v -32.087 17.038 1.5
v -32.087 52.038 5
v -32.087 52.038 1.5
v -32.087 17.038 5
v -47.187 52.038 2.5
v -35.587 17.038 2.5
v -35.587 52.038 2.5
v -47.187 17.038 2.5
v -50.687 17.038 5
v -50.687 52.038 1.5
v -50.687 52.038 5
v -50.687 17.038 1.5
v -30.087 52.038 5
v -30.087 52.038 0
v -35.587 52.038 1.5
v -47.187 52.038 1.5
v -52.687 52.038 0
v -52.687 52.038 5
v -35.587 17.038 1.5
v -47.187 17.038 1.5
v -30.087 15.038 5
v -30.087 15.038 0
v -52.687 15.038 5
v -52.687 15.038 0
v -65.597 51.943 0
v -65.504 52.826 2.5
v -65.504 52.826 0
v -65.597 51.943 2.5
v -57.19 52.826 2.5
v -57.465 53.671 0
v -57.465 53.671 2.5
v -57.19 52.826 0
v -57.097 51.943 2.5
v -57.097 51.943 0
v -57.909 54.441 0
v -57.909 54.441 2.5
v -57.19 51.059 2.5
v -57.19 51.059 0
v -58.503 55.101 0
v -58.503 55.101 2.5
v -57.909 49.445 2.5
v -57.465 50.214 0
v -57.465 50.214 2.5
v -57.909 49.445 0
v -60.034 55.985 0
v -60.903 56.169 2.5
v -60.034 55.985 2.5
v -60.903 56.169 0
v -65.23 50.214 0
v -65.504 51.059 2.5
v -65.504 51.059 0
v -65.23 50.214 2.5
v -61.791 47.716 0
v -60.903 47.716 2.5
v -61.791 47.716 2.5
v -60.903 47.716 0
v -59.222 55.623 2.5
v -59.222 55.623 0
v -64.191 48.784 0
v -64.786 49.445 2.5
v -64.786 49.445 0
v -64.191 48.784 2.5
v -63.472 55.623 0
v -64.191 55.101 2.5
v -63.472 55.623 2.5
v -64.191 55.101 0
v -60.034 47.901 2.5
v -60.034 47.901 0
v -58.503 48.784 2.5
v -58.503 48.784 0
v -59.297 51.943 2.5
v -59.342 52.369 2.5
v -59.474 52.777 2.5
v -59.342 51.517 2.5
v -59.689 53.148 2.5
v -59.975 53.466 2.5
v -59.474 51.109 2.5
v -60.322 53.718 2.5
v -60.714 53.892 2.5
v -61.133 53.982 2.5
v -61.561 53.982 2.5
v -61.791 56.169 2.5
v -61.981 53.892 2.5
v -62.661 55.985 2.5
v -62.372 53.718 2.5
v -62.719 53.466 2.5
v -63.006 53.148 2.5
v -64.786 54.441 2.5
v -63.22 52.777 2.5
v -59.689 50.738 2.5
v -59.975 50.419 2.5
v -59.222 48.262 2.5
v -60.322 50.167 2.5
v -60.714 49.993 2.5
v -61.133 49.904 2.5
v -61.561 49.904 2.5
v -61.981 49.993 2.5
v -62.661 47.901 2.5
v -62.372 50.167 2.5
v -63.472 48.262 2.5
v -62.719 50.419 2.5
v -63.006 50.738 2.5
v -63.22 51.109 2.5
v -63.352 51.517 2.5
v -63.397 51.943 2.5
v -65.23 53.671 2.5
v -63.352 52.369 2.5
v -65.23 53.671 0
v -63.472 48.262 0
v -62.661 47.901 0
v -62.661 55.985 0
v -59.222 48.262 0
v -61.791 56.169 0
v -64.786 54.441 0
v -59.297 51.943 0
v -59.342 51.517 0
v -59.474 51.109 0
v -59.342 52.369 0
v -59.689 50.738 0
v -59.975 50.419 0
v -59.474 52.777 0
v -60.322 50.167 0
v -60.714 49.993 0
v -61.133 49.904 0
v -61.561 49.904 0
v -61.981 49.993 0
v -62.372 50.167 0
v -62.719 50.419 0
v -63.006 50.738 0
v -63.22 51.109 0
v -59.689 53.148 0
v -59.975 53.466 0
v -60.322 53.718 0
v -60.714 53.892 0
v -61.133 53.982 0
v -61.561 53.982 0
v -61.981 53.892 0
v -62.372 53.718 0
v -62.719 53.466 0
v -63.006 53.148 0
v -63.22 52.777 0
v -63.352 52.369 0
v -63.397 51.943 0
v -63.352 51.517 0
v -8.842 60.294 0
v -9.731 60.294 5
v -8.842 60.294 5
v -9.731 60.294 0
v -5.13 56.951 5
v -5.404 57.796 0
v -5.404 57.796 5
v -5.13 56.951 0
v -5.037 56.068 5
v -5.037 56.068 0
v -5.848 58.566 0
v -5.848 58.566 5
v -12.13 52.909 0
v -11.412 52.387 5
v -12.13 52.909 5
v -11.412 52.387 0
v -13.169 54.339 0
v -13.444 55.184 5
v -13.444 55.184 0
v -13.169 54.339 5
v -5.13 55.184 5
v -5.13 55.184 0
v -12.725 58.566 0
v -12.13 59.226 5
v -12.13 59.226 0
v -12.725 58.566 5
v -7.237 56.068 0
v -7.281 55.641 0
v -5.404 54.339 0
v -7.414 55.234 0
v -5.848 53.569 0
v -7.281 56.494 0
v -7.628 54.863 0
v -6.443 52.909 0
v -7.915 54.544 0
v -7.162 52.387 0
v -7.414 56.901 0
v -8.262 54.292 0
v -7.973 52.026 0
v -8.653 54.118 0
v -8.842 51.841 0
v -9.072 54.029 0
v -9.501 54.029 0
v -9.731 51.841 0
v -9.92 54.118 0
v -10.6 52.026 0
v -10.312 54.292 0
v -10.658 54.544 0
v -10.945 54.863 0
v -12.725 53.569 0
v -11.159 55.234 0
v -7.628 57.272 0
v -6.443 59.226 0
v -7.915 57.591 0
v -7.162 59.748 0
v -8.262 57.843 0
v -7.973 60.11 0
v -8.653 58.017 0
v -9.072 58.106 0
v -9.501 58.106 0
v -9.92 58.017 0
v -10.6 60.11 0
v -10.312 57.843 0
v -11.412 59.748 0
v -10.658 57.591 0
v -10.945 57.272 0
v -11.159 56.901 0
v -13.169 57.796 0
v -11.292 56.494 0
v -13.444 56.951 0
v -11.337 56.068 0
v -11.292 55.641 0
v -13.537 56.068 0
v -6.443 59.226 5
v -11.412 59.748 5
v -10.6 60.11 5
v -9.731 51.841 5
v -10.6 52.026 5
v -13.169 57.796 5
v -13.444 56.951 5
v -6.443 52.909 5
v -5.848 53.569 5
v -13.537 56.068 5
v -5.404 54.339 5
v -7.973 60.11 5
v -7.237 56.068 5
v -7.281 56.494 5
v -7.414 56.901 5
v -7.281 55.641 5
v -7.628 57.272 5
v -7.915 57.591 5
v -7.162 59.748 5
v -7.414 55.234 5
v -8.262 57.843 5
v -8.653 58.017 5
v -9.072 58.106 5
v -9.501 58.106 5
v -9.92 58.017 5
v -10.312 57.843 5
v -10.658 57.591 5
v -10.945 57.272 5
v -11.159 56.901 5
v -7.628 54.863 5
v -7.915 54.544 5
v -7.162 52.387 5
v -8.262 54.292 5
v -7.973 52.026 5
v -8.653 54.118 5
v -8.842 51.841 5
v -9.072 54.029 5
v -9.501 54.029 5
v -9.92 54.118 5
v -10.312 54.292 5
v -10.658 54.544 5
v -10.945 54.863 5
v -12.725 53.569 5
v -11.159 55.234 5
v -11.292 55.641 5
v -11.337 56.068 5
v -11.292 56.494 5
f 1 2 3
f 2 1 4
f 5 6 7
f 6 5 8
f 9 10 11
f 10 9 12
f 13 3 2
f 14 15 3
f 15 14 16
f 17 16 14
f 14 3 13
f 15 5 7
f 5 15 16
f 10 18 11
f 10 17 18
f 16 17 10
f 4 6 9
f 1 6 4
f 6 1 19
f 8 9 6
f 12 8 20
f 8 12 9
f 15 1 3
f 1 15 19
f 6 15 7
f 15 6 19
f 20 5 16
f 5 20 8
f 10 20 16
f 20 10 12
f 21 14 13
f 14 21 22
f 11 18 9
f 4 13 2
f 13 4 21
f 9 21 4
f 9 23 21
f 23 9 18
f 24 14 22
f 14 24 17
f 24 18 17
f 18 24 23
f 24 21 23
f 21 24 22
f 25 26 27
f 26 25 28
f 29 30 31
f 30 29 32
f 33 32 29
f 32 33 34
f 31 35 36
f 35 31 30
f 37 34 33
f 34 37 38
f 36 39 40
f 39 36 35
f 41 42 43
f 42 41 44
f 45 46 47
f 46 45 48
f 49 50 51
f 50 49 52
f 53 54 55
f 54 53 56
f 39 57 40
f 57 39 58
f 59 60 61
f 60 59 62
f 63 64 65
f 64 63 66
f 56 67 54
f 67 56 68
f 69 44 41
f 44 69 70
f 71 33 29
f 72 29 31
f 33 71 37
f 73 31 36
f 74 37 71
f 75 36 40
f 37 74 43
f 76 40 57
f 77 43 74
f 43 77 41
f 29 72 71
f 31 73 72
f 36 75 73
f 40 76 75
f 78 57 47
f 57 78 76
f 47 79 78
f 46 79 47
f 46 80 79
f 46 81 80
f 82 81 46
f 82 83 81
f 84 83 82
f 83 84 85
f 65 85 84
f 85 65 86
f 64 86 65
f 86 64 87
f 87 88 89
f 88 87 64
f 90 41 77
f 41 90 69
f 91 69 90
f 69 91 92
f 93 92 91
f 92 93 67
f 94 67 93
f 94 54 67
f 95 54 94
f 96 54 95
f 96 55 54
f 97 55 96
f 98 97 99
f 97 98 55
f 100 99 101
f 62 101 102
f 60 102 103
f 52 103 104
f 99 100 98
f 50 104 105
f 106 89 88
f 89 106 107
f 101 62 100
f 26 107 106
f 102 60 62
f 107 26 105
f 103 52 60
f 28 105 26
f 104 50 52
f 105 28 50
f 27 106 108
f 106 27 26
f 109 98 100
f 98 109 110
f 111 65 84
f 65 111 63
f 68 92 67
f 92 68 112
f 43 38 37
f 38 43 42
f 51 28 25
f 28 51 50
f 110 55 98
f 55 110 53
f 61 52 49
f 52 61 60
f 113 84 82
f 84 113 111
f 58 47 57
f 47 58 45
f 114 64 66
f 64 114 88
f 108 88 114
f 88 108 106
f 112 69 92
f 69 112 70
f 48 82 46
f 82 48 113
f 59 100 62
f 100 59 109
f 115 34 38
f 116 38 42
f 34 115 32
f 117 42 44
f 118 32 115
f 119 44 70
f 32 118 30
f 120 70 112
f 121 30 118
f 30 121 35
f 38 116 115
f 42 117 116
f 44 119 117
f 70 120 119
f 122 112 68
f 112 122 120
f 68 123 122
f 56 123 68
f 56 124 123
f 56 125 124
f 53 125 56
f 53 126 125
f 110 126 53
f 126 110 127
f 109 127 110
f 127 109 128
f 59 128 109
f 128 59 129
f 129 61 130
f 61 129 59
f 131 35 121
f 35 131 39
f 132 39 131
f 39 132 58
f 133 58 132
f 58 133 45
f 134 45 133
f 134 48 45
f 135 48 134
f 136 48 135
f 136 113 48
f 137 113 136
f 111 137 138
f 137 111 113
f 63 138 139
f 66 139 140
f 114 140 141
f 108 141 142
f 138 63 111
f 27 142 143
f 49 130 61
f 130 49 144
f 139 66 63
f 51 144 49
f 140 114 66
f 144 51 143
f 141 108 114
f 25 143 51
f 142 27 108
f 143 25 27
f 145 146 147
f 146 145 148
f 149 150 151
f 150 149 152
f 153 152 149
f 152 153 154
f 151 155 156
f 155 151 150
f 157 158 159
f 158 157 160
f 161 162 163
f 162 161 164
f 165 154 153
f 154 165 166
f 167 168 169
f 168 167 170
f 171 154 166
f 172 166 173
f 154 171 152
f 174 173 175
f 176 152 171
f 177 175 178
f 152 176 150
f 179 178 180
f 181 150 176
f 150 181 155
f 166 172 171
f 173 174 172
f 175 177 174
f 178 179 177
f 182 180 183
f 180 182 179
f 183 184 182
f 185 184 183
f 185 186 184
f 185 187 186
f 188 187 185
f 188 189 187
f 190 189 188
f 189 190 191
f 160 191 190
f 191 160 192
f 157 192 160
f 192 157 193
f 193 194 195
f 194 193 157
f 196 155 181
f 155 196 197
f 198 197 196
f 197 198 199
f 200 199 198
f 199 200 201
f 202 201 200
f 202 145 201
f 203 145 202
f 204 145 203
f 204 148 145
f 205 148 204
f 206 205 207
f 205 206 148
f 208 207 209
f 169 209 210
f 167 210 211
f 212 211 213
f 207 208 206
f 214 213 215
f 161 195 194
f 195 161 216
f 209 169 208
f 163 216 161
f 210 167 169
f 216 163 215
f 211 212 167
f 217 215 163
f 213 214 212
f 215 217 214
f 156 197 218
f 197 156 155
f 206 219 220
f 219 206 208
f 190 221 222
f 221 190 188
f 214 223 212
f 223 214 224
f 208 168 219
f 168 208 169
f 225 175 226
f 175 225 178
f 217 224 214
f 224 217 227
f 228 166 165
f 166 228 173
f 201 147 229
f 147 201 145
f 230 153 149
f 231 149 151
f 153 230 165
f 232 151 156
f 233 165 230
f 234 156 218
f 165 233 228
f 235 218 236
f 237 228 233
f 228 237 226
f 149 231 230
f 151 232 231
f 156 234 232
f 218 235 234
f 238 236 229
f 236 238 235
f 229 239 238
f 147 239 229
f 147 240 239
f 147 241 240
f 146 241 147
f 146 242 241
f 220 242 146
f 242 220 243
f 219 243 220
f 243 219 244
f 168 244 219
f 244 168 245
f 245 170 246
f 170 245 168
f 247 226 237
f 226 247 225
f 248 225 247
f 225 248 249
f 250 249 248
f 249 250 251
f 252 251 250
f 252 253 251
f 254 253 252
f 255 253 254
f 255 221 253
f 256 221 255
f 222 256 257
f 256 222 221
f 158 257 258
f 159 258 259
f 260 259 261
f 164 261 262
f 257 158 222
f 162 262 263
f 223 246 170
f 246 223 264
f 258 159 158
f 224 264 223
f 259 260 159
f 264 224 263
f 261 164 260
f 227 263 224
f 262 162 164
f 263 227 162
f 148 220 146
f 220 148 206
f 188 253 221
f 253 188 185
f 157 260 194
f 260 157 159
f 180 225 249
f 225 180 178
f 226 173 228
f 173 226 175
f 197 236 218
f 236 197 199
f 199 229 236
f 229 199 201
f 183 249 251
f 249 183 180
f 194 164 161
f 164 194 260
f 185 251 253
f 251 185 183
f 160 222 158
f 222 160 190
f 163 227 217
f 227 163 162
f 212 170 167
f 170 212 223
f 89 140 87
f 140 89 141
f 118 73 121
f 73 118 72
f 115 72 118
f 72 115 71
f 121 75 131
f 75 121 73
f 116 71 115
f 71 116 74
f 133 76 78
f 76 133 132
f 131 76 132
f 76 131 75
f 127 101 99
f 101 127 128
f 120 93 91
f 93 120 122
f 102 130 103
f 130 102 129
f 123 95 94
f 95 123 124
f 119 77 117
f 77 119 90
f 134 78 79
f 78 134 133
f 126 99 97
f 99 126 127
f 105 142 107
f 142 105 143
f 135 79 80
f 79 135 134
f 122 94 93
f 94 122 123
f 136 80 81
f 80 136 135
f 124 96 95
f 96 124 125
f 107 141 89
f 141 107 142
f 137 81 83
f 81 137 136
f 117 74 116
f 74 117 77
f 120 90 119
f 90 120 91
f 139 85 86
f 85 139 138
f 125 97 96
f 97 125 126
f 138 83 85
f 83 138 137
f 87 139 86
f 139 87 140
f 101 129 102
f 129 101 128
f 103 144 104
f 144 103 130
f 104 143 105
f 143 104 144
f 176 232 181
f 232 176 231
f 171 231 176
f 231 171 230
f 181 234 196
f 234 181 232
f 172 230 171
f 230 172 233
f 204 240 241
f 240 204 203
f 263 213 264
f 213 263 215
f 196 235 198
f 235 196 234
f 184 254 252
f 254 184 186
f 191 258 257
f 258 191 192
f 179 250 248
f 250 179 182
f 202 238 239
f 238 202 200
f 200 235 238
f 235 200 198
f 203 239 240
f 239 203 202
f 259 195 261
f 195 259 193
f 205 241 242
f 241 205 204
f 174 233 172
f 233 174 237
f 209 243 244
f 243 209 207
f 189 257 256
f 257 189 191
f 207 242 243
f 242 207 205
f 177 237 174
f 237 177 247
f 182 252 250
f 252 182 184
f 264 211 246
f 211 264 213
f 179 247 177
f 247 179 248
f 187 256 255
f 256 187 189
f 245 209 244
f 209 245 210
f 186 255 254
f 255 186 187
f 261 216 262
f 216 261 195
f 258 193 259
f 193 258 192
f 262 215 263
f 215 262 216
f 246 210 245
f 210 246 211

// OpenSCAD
union () {
  translate ([-41.38668488875595, 52.038033800443245, 0]) {
    translate ([0, 0, 5/2]) {
      difference () {
        translate ([0, -37/2, 0]) {
          cube ([22.6, 37, 5], center=true);
        }
        translate ([0, -35/2, 3/2]) {
          union () {
            cube ([18.6, 35, 3], center=true);
            translate ([7.550000000000001, 0, -3/2]) {
              cube ([3.5, 35, 2], center=true);
            }
            translate ([-7.550000000000001, 0, -3/2]) {
              cube ([3.5, 35, 2], center=true);
            }
          }
        }
      }
    }
  }
  difference () {
    union () {
      translate ([-61.34719666540748, 51.94277421115473, 5/4]) {
        union () {
          cylinder ($fn=30, h=5/2, r1=4.25, r2=4.25, center=true);
        }
      }
      translate ([-9.286683882314678, 56.06751462186621, 5/2]) {
        union () {
          cylinder ($fn=30, h=5, r1=4.25, r2=4.25, center=true);
        }
      }
    }
    union () {
      translate ([-61.34719666540748, 51.94277421115473, 5/4]) {
        union () {
          cylinder ($fn=30, h=5/2, r1=2.05, r2=2.05, center=true);
        }
      }
      translate ([-9.286683882314678, 56.06751462186621, 5/2]) {
        union () {
          cylinder ($fn=30, h=5, r1=2.05, r2=2.05, center=true);
        }
      }
    }
  }
}
